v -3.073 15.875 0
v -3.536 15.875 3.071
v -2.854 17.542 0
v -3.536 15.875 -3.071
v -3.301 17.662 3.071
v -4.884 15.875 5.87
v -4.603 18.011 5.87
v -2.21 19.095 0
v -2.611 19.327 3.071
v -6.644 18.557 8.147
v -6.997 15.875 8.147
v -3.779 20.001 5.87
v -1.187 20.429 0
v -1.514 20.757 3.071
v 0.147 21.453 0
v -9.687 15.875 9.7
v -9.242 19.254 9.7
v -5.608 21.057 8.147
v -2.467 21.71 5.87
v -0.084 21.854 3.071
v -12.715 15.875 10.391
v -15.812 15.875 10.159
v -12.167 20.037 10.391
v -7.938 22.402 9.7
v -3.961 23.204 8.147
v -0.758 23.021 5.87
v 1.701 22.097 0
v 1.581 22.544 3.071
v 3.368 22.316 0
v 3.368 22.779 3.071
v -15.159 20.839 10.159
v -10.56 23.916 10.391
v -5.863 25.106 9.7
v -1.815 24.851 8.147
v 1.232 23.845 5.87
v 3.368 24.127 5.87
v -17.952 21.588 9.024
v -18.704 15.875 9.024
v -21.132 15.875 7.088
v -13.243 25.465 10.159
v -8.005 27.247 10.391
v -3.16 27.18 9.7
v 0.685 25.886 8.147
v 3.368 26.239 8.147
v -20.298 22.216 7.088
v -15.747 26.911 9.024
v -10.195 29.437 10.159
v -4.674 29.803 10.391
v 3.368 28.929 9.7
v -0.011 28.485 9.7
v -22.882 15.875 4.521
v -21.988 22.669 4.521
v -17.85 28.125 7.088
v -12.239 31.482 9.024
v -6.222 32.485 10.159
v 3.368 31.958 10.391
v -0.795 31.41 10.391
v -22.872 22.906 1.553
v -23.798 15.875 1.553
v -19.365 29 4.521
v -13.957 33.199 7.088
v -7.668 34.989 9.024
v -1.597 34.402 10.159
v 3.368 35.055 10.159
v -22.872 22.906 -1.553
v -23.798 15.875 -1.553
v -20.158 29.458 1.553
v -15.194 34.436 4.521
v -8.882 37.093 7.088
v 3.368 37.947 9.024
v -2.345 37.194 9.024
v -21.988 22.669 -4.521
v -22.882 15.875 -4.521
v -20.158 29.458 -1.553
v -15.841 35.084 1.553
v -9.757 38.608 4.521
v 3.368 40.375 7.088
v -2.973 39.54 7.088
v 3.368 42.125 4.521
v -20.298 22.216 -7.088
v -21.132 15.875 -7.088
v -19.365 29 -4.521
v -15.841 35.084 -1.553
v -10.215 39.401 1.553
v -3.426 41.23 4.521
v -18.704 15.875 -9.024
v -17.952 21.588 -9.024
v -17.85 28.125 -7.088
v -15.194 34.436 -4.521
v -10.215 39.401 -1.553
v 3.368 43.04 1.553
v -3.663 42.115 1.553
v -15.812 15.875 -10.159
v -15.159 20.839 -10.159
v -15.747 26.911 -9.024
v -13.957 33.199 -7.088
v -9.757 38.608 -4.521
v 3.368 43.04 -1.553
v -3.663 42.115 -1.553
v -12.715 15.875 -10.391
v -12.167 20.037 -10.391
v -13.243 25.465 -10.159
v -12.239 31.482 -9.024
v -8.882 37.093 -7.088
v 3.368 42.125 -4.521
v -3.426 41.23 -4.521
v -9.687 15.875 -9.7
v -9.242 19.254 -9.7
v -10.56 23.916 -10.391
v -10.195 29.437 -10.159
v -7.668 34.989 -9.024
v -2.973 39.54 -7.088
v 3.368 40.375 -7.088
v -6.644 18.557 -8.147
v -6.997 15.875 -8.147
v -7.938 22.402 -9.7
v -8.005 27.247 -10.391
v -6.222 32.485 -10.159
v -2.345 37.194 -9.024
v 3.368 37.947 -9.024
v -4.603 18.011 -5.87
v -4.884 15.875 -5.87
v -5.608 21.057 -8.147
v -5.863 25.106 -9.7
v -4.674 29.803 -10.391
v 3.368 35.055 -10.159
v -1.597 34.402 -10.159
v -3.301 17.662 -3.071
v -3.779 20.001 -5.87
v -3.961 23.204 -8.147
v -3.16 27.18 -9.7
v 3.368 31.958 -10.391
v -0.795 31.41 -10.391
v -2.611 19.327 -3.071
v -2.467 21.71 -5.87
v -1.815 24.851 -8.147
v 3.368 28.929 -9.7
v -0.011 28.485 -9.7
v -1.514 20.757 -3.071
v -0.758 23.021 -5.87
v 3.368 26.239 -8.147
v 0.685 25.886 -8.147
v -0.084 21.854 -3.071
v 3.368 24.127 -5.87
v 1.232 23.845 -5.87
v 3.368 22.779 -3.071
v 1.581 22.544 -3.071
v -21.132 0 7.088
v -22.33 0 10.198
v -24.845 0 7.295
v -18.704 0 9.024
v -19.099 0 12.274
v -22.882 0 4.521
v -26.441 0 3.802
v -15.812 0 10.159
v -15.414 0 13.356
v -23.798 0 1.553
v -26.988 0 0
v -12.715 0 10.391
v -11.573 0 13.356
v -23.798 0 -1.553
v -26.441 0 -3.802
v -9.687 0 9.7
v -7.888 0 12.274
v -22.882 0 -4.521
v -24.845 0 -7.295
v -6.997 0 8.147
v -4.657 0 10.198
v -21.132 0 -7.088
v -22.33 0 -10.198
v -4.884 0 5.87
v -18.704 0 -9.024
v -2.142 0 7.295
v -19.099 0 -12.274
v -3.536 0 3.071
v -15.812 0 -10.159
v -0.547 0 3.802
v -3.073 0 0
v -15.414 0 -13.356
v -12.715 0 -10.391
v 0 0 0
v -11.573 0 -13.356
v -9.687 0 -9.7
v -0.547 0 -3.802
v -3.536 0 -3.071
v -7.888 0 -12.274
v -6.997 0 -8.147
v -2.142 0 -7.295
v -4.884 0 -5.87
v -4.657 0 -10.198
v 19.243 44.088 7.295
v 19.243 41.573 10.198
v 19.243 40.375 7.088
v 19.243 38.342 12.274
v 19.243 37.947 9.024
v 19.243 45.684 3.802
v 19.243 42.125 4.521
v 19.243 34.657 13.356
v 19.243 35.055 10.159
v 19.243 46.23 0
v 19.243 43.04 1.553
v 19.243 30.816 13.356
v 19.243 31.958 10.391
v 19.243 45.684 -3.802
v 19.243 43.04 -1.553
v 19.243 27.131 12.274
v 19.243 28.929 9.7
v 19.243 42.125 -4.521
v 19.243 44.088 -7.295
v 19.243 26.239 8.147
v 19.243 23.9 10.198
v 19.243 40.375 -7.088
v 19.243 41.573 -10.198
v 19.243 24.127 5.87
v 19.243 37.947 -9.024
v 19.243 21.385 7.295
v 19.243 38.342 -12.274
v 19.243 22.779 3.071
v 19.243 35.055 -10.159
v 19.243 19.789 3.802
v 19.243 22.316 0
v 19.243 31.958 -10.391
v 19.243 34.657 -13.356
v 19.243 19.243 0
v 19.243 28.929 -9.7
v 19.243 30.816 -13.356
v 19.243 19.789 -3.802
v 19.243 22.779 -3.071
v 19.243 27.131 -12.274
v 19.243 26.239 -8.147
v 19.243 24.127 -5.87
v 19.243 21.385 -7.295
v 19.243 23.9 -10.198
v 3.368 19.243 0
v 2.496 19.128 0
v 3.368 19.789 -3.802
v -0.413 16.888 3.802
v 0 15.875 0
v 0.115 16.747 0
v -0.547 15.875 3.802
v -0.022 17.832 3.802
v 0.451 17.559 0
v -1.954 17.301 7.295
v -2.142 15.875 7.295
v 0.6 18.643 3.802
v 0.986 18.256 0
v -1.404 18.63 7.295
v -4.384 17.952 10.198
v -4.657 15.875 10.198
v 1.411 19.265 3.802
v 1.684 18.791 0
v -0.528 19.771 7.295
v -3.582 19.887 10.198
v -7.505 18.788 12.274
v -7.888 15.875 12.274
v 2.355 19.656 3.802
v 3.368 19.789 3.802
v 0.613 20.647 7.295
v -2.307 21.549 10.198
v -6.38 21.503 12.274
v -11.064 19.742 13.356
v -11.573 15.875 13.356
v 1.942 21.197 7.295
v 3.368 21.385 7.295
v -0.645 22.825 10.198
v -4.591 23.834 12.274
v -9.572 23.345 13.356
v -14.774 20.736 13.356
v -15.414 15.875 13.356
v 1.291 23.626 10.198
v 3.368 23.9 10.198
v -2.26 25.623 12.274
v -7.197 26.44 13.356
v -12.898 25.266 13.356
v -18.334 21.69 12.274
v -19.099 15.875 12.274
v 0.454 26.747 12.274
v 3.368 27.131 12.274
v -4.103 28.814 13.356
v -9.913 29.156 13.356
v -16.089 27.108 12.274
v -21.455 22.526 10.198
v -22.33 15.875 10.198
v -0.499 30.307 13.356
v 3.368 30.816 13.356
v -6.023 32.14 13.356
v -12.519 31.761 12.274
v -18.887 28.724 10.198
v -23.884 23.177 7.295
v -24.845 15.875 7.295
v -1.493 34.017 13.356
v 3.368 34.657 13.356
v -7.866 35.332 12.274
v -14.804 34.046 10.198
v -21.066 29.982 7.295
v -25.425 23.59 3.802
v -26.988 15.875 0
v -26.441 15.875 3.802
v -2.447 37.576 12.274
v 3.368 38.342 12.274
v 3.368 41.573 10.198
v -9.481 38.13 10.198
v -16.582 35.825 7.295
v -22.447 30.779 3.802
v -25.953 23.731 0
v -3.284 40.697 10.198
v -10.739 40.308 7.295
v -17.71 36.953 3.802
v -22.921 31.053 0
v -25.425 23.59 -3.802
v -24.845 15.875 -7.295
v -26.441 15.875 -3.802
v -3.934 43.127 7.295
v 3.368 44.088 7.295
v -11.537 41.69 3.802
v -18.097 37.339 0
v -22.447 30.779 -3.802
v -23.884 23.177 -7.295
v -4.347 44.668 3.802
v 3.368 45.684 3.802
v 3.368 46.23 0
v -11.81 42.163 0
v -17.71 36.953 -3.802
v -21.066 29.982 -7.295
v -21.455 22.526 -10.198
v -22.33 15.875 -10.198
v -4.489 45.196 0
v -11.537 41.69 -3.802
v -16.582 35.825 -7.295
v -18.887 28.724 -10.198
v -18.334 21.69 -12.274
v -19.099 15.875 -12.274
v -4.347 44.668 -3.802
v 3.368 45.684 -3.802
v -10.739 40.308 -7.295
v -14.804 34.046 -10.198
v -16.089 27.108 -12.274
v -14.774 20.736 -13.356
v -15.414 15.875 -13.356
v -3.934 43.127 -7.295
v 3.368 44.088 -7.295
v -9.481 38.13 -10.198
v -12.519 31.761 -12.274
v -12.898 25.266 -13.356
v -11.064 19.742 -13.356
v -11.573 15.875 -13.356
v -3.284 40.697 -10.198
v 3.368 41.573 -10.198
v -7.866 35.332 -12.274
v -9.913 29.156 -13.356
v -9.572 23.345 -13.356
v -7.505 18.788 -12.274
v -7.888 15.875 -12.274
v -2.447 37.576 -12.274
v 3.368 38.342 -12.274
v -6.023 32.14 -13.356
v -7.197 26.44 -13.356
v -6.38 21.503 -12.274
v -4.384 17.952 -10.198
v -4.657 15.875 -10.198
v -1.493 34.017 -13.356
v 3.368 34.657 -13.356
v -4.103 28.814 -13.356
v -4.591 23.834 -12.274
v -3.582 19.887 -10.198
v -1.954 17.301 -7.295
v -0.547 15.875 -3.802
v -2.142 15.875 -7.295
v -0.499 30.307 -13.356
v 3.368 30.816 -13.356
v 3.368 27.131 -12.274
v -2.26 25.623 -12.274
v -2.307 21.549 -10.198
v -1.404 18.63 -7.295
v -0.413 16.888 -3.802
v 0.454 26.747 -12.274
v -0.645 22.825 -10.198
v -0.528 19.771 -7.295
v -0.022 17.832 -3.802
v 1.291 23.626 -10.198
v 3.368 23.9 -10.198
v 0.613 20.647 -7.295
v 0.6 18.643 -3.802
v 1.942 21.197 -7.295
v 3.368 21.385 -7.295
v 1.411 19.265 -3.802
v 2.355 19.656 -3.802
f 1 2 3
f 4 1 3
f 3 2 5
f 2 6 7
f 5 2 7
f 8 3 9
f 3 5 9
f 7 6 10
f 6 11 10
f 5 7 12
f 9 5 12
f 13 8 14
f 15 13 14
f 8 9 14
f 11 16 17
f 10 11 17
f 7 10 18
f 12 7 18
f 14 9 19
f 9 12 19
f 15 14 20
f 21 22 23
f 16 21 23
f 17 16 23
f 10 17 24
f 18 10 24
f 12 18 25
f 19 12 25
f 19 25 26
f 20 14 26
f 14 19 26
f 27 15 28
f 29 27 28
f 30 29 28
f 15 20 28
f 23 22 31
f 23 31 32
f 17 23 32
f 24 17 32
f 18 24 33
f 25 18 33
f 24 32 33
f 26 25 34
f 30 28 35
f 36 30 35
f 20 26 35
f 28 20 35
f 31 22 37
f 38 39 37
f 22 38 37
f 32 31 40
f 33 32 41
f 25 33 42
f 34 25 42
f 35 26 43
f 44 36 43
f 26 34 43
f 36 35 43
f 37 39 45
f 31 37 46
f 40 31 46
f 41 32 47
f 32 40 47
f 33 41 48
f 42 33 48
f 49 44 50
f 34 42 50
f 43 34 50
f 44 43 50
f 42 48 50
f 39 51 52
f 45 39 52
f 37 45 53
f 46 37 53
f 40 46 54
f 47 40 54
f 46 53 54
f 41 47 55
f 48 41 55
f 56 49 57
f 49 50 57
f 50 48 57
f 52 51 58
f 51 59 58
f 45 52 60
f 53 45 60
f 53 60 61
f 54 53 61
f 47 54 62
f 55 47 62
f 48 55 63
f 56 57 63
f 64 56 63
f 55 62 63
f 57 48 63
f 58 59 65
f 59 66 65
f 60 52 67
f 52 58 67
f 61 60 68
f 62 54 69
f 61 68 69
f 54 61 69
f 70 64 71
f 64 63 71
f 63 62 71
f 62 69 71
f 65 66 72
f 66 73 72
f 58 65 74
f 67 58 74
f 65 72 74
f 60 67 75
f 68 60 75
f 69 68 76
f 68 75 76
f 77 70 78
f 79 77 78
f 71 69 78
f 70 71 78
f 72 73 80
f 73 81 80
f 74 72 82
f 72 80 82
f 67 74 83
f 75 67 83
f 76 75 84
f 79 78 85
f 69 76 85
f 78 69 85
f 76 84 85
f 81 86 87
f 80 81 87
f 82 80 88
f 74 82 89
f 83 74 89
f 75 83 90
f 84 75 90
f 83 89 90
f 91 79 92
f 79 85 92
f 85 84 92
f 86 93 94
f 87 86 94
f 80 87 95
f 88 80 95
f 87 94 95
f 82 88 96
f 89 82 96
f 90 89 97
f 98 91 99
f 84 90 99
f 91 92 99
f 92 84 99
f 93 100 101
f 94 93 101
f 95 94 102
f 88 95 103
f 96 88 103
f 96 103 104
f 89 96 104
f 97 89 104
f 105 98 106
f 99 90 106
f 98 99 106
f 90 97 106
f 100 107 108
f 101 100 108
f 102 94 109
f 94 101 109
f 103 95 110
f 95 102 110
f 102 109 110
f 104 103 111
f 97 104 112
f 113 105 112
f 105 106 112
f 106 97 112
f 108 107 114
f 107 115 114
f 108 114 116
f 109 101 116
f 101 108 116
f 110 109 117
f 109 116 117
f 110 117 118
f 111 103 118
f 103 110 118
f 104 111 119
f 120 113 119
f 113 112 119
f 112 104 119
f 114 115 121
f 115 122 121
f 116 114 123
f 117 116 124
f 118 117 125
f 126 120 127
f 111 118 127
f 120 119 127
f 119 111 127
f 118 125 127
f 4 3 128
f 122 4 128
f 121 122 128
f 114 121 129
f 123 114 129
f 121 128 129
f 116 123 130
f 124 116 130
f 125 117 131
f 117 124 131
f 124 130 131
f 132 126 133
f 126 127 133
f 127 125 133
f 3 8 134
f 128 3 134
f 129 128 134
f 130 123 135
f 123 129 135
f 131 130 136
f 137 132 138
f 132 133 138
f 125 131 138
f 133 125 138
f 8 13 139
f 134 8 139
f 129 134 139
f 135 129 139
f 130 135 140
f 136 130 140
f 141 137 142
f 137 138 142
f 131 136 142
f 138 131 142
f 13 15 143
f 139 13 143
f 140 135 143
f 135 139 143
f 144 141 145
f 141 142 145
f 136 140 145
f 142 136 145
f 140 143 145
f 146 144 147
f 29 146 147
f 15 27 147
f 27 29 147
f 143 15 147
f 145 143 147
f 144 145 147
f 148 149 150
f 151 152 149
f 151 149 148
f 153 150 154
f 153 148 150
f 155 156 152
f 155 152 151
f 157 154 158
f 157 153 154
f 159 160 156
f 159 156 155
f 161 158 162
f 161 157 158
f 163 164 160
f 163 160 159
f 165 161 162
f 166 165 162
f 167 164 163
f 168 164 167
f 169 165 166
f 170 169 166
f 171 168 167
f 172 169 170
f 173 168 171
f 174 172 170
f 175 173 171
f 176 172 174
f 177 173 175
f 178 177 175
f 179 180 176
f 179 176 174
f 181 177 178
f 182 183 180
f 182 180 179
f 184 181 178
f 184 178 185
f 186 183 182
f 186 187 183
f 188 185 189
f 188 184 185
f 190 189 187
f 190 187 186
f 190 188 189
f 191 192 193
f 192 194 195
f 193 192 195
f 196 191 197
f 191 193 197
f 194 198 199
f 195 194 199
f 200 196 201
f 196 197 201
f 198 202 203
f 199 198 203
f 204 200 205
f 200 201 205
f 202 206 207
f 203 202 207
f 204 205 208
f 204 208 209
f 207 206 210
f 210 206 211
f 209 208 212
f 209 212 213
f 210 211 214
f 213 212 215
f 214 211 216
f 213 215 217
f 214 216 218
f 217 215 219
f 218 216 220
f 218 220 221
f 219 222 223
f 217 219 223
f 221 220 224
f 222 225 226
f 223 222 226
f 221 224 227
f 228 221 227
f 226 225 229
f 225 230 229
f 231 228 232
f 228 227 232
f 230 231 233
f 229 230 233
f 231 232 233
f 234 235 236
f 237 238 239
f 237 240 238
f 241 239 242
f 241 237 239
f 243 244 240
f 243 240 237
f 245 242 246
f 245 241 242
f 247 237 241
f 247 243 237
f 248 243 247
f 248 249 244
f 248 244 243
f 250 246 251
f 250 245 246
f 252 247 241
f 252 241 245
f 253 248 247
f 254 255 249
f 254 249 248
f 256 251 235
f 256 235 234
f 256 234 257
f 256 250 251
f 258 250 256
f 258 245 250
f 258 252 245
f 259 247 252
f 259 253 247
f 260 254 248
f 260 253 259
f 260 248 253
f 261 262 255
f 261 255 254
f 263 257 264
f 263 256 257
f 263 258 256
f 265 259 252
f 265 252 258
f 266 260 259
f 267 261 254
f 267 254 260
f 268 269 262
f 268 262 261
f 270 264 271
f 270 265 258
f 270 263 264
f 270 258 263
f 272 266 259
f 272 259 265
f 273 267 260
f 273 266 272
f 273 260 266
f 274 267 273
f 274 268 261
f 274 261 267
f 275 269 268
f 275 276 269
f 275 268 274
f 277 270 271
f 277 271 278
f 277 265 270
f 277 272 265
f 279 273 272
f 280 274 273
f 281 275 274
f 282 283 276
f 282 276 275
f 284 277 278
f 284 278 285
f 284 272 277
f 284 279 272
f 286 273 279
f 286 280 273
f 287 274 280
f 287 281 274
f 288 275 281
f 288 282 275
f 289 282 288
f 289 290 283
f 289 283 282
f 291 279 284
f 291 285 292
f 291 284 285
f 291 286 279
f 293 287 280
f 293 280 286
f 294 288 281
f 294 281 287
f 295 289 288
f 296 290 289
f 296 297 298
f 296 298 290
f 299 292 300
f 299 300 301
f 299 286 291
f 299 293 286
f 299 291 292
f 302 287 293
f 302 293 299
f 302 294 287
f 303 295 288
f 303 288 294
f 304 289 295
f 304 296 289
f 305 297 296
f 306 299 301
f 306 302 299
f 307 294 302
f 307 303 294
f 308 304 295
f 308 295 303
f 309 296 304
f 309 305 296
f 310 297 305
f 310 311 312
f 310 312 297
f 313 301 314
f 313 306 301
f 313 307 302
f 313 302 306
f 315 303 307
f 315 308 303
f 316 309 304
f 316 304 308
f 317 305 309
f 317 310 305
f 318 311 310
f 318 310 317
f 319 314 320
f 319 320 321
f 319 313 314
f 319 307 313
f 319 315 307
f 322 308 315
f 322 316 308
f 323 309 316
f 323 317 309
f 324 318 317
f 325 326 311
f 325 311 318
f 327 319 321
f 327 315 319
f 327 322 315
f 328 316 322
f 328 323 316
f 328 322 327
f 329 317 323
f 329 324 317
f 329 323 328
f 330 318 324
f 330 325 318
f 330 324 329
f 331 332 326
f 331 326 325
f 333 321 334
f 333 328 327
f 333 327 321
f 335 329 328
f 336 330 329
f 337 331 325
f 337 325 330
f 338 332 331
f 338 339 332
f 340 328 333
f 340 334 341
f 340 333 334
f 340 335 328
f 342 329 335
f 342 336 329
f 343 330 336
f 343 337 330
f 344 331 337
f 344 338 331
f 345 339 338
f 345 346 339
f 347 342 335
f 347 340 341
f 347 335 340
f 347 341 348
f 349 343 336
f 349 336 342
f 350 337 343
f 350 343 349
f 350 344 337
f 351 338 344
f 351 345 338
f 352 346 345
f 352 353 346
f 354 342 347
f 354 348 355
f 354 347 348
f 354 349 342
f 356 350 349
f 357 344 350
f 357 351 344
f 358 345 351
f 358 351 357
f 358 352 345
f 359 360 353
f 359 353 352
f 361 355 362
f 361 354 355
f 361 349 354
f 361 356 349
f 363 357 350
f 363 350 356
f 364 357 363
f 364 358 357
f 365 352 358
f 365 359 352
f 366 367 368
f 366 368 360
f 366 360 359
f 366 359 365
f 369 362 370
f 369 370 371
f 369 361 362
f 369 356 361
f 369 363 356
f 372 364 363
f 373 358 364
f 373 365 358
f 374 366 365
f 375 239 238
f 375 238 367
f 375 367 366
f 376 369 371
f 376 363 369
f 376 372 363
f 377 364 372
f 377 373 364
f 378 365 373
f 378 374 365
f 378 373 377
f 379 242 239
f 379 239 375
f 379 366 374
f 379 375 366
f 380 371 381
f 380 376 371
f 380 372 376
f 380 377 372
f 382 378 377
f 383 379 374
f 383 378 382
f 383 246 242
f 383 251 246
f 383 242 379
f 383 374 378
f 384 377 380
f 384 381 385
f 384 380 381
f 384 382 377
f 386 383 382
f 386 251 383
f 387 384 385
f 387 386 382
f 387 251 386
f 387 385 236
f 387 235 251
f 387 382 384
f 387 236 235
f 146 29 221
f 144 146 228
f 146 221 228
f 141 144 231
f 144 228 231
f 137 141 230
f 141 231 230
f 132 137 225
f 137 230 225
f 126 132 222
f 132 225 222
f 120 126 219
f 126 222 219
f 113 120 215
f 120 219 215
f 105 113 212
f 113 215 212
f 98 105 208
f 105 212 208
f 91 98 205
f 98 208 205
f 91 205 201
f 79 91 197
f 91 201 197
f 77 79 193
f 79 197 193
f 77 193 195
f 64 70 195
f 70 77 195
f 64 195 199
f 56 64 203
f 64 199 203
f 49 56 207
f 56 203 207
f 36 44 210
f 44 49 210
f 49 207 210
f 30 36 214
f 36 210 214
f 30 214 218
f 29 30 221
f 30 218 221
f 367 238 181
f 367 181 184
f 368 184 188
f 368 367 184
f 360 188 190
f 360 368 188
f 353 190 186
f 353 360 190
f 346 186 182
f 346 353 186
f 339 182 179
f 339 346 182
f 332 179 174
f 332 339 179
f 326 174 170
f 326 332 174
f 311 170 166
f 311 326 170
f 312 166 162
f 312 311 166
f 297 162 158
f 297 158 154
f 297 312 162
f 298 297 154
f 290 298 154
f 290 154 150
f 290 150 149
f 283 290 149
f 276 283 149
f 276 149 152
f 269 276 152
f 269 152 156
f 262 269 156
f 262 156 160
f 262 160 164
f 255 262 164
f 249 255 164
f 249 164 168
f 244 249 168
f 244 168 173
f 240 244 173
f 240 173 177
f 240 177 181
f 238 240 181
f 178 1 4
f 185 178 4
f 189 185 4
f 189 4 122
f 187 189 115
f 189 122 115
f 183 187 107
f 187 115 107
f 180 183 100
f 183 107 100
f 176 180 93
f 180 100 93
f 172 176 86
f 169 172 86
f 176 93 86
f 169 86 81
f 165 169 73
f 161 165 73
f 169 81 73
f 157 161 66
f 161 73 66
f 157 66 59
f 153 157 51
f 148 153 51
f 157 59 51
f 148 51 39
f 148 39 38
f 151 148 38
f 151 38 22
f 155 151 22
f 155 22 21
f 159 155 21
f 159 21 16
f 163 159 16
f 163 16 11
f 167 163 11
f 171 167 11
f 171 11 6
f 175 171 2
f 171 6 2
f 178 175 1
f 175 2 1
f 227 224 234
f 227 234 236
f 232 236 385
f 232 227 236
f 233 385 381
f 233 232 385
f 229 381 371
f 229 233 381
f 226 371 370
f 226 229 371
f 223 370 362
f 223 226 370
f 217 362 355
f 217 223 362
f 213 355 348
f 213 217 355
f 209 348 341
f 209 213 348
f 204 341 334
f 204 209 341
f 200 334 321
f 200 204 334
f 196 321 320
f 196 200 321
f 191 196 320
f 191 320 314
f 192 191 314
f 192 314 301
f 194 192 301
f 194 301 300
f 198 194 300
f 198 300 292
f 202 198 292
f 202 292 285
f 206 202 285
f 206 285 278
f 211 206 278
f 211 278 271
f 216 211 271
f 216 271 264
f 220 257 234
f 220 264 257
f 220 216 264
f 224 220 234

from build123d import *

# Parameters (mm, degrees)
F1_R = 13.49375
F3_T = -3.0734


with BuildPart() as f2:
    # F2: sweep along a path in F0
    with BuildLine(Plane.XY) as f2_path:
        Line((0, 0), (0, 15.875))
        ThreePointArc((0, 15.875), (0.9863460454, 18.25625), (3.3675960454, 19.2425960454))
        Line((3.3675960454, 19.2425960454), (19.2425960454, 19.2425960454))
    # F1 (on Front) → F2 (sweep)
    with BuildSketch(Plane.XZ):
        with Locations((-13.49375, 0)):
            Circle(F1_R)
    sweep(path=f2_path.line)

    # F3
    f3_openings = [f2.faces().sort_by_distance(p)[0] for p in [
        (-13.49375, 0, 0),
        (19.242596, 32.736346, 0),
    ]]
    offset(amount=F3_T, openings=f3_openings)


solid = f2.part
